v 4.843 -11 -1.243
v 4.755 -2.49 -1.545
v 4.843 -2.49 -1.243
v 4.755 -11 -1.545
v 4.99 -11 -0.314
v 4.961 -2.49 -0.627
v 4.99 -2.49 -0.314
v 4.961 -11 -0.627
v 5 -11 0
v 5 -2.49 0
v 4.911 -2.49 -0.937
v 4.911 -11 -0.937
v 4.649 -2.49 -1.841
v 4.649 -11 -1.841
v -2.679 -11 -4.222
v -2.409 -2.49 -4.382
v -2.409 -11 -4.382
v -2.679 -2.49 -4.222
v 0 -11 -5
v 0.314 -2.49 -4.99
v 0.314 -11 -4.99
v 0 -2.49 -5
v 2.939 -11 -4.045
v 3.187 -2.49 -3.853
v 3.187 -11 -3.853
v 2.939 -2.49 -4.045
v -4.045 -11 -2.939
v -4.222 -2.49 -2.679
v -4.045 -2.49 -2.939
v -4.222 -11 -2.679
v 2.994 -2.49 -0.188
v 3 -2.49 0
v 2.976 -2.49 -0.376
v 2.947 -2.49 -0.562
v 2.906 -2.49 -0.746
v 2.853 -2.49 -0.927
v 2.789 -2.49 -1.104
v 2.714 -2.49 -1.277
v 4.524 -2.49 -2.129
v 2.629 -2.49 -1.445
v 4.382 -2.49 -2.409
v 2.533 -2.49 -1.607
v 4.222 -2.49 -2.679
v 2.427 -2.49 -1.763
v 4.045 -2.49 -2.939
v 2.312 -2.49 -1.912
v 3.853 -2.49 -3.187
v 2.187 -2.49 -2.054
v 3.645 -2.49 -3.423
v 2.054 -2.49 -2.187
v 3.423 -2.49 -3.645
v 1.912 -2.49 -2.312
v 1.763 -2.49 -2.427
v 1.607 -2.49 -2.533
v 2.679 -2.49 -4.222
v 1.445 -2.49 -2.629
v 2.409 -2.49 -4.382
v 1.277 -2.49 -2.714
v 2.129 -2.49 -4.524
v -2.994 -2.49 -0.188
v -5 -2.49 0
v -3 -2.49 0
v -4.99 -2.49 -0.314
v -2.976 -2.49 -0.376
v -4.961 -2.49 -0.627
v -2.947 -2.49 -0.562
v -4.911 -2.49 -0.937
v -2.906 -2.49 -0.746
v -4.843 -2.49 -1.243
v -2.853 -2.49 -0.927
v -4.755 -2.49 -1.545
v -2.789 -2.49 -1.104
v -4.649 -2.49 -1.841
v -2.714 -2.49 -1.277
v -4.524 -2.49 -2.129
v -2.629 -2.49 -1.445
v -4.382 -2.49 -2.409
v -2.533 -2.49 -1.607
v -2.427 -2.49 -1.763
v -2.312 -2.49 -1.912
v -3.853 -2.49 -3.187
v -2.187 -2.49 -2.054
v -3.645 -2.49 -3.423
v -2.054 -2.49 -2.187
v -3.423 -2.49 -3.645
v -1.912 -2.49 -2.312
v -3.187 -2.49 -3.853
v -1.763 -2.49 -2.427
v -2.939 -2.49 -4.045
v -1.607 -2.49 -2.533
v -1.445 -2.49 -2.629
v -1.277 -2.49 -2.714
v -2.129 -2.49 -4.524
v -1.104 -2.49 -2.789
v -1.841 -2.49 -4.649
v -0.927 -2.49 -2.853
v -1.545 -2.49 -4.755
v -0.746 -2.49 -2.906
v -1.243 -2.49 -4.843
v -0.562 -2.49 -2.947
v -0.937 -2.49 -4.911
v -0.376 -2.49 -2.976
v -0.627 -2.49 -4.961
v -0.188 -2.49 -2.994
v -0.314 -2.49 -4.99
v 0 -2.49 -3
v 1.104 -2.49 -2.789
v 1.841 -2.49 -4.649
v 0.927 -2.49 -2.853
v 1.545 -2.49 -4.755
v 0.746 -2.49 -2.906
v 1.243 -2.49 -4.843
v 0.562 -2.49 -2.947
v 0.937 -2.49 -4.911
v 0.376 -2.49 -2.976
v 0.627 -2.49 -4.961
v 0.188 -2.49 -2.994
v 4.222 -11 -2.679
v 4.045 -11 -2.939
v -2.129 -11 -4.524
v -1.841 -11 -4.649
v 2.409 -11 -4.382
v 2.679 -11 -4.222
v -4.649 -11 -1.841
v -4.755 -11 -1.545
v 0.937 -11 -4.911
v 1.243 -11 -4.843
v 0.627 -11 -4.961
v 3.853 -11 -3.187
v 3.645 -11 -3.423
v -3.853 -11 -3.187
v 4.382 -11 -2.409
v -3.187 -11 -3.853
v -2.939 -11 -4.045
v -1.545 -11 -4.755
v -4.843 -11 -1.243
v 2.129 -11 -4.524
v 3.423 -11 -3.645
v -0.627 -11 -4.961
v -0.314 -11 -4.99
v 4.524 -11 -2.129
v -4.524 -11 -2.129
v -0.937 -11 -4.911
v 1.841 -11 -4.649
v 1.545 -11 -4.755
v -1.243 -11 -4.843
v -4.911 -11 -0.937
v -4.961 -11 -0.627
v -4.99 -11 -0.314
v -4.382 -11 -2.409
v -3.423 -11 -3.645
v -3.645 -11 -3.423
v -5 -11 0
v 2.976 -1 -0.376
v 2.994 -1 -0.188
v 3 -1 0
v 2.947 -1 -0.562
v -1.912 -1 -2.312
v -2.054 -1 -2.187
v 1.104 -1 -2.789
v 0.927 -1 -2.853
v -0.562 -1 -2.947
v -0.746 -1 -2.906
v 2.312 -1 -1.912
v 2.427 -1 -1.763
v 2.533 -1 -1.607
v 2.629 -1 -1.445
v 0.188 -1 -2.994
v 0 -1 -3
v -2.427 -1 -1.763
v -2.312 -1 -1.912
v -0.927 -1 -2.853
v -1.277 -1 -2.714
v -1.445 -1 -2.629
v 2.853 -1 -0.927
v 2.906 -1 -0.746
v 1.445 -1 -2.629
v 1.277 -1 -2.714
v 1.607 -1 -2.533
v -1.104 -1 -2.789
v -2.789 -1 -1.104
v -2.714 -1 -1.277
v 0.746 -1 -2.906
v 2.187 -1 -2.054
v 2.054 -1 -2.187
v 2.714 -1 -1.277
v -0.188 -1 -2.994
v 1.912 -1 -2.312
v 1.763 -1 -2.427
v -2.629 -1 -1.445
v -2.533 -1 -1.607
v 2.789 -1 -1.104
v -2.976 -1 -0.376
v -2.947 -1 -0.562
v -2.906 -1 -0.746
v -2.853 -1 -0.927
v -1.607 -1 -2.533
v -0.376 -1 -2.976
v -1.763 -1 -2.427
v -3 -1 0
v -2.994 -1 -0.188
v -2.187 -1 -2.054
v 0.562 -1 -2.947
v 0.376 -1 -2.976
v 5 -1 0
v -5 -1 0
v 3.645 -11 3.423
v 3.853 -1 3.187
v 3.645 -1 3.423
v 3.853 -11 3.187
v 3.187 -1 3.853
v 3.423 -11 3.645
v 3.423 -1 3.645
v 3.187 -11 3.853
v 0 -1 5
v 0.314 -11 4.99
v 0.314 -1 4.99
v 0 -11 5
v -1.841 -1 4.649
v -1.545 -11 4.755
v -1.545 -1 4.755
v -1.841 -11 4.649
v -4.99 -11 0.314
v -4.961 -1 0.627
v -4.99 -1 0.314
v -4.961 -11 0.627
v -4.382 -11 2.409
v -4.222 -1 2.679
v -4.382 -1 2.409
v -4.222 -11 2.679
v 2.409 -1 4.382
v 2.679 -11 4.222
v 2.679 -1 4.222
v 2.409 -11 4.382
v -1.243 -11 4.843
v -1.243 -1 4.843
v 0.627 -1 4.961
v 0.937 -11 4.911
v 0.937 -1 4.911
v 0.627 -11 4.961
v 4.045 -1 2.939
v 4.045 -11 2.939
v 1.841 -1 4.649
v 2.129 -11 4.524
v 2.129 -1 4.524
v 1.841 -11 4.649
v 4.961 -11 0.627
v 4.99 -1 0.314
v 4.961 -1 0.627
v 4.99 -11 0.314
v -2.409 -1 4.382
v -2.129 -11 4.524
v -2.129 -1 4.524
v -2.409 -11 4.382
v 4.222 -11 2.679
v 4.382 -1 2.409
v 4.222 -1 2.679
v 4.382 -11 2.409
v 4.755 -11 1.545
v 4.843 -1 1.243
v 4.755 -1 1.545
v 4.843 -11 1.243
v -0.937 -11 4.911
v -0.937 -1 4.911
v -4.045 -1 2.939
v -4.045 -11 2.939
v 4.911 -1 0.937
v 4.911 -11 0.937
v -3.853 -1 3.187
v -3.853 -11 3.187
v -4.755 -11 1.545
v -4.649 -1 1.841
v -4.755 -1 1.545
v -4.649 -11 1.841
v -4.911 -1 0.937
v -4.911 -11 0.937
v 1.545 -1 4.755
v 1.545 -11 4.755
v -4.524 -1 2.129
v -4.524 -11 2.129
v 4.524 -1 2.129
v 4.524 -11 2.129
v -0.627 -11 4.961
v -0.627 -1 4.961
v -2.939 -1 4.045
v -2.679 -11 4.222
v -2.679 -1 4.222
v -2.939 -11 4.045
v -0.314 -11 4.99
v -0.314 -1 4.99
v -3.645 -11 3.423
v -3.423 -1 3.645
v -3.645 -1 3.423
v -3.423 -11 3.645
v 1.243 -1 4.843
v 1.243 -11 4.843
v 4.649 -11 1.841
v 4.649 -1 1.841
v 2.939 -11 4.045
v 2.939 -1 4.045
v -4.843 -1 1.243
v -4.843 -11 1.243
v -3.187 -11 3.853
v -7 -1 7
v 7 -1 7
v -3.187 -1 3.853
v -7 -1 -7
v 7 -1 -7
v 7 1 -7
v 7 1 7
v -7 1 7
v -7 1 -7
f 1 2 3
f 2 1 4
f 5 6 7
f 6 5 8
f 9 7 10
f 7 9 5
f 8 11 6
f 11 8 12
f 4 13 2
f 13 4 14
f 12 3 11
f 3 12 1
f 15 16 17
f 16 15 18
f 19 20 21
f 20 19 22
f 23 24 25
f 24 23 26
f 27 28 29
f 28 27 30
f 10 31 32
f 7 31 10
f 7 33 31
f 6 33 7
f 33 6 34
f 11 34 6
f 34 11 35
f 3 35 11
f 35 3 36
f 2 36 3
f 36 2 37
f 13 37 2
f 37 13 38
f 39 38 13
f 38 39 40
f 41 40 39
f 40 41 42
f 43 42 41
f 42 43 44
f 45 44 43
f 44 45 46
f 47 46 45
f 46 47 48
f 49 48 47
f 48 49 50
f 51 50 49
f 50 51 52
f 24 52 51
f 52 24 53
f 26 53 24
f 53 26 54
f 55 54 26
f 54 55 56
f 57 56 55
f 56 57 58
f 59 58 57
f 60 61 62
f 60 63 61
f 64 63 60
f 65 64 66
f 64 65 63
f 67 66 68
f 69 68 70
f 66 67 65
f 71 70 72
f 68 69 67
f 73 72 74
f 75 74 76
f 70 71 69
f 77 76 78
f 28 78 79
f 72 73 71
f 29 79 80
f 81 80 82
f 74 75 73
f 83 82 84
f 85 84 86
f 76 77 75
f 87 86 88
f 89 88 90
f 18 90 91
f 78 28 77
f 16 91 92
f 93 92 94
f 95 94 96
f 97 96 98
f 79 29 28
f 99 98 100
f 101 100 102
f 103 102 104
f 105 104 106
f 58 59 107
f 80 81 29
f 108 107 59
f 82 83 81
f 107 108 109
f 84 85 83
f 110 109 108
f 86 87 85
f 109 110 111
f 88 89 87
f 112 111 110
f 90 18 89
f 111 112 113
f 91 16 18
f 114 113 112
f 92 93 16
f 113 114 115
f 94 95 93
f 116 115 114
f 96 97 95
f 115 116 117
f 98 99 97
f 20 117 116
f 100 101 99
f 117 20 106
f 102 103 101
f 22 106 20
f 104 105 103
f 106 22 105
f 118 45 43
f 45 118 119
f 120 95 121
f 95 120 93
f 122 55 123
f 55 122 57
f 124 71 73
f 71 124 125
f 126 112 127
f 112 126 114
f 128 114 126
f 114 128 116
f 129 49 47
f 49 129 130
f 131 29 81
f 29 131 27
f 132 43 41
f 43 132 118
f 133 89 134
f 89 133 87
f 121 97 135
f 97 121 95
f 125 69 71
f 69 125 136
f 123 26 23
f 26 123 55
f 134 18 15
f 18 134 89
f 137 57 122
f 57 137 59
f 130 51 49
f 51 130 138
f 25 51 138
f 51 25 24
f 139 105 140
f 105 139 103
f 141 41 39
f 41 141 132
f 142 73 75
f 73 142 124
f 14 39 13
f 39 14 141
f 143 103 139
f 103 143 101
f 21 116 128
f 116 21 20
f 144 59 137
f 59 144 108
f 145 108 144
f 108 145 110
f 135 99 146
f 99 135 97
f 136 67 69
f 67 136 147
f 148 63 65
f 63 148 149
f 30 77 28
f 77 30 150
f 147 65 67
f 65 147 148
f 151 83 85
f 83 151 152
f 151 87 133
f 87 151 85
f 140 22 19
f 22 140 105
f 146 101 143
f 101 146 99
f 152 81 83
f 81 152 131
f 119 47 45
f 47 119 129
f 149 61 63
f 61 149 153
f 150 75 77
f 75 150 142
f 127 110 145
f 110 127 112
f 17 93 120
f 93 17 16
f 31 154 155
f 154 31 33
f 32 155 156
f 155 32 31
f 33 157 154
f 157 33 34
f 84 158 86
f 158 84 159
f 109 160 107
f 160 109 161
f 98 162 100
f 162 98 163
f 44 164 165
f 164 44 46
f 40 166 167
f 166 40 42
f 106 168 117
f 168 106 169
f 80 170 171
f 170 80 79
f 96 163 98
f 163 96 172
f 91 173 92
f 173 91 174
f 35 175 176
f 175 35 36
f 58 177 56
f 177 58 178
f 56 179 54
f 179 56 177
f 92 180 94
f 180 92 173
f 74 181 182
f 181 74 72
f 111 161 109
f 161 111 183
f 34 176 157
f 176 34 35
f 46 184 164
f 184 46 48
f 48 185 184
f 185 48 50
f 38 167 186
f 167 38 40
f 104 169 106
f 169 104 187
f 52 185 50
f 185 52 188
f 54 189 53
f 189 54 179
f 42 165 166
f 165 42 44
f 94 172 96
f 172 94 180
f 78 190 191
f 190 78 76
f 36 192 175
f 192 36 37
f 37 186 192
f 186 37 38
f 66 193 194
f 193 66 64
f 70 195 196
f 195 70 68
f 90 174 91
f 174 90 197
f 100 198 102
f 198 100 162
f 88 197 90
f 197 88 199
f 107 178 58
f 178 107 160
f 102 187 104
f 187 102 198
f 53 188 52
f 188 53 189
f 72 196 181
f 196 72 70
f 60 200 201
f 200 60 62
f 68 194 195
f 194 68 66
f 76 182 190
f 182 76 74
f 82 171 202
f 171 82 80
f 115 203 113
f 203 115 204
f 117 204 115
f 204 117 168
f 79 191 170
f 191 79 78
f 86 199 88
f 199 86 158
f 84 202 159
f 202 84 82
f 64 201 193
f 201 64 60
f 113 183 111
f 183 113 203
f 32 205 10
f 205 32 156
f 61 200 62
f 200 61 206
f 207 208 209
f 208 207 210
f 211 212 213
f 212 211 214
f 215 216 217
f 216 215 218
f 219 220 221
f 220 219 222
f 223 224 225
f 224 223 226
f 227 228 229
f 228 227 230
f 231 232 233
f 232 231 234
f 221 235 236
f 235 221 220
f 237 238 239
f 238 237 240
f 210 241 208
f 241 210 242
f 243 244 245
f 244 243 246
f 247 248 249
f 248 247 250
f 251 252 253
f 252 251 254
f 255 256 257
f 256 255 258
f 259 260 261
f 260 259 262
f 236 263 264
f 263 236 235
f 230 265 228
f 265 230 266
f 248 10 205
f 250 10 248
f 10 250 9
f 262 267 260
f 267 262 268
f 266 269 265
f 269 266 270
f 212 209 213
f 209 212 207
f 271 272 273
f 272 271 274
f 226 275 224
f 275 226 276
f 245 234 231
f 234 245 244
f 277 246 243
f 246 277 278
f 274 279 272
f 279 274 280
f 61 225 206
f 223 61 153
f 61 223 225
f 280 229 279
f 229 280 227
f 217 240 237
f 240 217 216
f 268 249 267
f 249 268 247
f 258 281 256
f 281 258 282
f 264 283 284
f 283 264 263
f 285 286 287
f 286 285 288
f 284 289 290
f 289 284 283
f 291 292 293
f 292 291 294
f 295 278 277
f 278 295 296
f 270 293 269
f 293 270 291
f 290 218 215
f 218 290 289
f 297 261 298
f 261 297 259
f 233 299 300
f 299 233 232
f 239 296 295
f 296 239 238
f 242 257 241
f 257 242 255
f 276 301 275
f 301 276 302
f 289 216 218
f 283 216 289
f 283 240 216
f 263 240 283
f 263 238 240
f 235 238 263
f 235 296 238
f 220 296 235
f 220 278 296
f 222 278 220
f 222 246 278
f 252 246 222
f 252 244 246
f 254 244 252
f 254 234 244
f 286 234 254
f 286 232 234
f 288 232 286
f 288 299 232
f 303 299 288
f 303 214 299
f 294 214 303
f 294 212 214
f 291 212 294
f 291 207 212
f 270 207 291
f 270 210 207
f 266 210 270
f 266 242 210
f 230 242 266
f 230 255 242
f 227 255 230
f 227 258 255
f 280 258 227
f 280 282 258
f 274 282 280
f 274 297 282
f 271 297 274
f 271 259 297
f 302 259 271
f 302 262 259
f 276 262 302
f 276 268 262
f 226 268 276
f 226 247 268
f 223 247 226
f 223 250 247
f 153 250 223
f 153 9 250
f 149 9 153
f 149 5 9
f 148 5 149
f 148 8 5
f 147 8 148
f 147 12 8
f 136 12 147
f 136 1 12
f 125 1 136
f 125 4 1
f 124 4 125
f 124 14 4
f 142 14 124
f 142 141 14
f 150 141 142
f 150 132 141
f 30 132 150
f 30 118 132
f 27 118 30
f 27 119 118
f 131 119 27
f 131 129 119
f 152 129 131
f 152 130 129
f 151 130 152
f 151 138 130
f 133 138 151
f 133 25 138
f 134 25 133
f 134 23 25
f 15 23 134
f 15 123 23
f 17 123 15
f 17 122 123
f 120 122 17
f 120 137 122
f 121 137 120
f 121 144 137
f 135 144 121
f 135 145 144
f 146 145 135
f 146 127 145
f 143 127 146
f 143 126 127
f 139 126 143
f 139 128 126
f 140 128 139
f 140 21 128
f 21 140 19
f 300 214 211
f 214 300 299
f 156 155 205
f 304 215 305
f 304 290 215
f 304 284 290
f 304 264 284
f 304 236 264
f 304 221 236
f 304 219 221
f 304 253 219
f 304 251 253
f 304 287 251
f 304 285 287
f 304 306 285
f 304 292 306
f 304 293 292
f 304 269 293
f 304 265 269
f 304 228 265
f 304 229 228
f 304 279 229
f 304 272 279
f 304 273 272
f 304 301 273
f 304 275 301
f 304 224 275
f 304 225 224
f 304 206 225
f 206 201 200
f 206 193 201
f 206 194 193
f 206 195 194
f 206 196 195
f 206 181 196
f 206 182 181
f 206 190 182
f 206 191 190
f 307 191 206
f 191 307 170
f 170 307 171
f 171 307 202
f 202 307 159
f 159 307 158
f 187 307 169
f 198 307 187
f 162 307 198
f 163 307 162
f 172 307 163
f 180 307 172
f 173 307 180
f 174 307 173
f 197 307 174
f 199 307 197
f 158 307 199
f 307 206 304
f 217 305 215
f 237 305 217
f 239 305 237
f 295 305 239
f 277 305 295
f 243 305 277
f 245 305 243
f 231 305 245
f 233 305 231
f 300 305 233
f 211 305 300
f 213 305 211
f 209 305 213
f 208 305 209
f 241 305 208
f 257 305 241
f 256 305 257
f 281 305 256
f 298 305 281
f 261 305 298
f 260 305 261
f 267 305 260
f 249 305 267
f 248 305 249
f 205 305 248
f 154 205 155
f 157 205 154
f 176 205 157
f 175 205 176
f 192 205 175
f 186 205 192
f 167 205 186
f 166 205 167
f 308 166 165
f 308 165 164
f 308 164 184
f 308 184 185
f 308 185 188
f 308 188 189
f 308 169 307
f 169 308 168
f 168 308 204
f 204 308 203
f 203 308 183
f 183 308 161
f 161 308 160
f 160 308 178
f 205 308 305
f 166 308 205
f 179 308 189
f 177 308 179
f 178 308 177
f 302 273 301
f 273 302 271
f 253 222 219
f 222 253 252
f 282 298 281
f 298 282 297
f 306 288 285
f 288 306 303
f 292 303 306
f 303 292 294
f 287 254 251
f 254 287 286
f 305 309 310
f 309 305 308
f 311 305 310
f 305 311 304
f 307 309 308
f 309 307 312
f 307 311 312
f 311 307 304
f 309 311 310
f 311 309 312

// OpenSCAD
// file: ../common/functions.scad
// Module: accessoryBaseWithPins
// Generates a rectangular base with evenly spaced pins on its top surface.
// The pins are arranged in a grid pattern, and their number is calculated
// based on the dimensions of the base and the spacing between pins.
//
// Parameters:
// - baseWidth (number): The width of the base in the X direction.
// - baseHeight (number): The height of the base in the Y direction.
// - baseThickness (number): The thickness of the base in the Z direction.
module accessoryBaseWithPins(baseWidth, baseHeight, baseThickness) {
    $fn = 100;
    
    // Pin Parameters
    pinDiameter = pinDiameter();
    pinHeight = pinHeight();
    pinSpacingX = pinXSpacing();
    pinSpacingY = pinYSpacing();
    cutoutThickness = 1.5;

    // Calculate number of pins
    numPinsX = calculateColumnsOfPins(baseWidth);
    numPinsY = calculateRowsOfPins(baseHeight);

    // Total span of pins
    totalSpanX = (numPinsX - 1) * pinSpacingX;
    totalSpanY = (numPinsY - 1) * pinSpacingY;

    difference() {
        // Pins centered on top face
        rotate([90, 0, 0])
        for (i = [0 : numPinsX - 1])
            for (j = [0 : numPinsY - 1]) {
                xOffset = -totalSpanX / 2 + i * pinSpacingX;
                zOffset = -totalSpanY / 2 + j * pinSpacingY;
                translate([xOffset, zOffset, pinHeight / 2 + baseThickness / 2])
                    difference() {
                        rotate([0, 180, 180])
                        color("orange")
                        pin();
                    }
            }
    }

    // Base
    cube([baseWidth, baseThickness, baseHeight], center = true);
}

// Module: pin
// Creates a single pin with a cylindrical shape and a cutout on its top surface.
// The cutout is a washer-like structure with a half-cylinder removed.
//
// Parameters:
// - pinDiameter (number): The diameter of the pin.
// - pinHeight (number): The height of the pin.
// - cutoutThickness (number): The thickness of the washer-like cutout on the top of the pin.
module pin(pinDiameter = pinDiameter(), pinHeight = pinHeight(), cutoutThickness = pinCutoutThickness()) {
    $fn = 100;
    $innerD = 6;
    
    difference() {
        cylinder(h = pinHeight, r = pinDiameter / 2, center = true);

        translate([0, 0, pinHeight / 2 - cutoutThickness / 2 + 0.01])
        difference() {
            // Full washer
            cylinder(h = cutoutThickness, r = pinDiameter / 2, center = true);
                
            // Slightly taller to ensure clean subtraction
            cylinder(h = cutoutThickness, r = $innerD / 2, center = true);

            // Cut it in half
            translate([-pinDiameter / 2, -pinDiameter / 2, -cutoutThickness])
            cube([pinDiameter, pinDiameter / 2, cutoutThickness * 2]);
        }
    }
}

function pinDiameter() = 10;
function pinHeight() = 10;
function pinXSpacing() = 22;
function pinYSpacing() = 34;
function pinCutoutThickness() = 1.5;
function calculateRowsOfPins(distance) = max(1, ceil((distance-pinDiameter()) / pinYSpacing()));
function calculateColumnsOfPins(distance) = max(1, ceil((distance-pinDiameter()) / pinXSpacing()));
// main file
include <../common/functions.scad>

// The Width of the accessory base
$accessoryBaseWidth = 14; // [14:250]

// The Height of the accessory base
$accessoryBaseHeight = 14; // [14:220]

// Thickness of the accessory base
$accessoryBaseThickness = 2; // [0:5]

accessoryBaseWithPins($accessoryBaseWidth, $accessoryBaseHeight, $accessoryBaseThickness);
